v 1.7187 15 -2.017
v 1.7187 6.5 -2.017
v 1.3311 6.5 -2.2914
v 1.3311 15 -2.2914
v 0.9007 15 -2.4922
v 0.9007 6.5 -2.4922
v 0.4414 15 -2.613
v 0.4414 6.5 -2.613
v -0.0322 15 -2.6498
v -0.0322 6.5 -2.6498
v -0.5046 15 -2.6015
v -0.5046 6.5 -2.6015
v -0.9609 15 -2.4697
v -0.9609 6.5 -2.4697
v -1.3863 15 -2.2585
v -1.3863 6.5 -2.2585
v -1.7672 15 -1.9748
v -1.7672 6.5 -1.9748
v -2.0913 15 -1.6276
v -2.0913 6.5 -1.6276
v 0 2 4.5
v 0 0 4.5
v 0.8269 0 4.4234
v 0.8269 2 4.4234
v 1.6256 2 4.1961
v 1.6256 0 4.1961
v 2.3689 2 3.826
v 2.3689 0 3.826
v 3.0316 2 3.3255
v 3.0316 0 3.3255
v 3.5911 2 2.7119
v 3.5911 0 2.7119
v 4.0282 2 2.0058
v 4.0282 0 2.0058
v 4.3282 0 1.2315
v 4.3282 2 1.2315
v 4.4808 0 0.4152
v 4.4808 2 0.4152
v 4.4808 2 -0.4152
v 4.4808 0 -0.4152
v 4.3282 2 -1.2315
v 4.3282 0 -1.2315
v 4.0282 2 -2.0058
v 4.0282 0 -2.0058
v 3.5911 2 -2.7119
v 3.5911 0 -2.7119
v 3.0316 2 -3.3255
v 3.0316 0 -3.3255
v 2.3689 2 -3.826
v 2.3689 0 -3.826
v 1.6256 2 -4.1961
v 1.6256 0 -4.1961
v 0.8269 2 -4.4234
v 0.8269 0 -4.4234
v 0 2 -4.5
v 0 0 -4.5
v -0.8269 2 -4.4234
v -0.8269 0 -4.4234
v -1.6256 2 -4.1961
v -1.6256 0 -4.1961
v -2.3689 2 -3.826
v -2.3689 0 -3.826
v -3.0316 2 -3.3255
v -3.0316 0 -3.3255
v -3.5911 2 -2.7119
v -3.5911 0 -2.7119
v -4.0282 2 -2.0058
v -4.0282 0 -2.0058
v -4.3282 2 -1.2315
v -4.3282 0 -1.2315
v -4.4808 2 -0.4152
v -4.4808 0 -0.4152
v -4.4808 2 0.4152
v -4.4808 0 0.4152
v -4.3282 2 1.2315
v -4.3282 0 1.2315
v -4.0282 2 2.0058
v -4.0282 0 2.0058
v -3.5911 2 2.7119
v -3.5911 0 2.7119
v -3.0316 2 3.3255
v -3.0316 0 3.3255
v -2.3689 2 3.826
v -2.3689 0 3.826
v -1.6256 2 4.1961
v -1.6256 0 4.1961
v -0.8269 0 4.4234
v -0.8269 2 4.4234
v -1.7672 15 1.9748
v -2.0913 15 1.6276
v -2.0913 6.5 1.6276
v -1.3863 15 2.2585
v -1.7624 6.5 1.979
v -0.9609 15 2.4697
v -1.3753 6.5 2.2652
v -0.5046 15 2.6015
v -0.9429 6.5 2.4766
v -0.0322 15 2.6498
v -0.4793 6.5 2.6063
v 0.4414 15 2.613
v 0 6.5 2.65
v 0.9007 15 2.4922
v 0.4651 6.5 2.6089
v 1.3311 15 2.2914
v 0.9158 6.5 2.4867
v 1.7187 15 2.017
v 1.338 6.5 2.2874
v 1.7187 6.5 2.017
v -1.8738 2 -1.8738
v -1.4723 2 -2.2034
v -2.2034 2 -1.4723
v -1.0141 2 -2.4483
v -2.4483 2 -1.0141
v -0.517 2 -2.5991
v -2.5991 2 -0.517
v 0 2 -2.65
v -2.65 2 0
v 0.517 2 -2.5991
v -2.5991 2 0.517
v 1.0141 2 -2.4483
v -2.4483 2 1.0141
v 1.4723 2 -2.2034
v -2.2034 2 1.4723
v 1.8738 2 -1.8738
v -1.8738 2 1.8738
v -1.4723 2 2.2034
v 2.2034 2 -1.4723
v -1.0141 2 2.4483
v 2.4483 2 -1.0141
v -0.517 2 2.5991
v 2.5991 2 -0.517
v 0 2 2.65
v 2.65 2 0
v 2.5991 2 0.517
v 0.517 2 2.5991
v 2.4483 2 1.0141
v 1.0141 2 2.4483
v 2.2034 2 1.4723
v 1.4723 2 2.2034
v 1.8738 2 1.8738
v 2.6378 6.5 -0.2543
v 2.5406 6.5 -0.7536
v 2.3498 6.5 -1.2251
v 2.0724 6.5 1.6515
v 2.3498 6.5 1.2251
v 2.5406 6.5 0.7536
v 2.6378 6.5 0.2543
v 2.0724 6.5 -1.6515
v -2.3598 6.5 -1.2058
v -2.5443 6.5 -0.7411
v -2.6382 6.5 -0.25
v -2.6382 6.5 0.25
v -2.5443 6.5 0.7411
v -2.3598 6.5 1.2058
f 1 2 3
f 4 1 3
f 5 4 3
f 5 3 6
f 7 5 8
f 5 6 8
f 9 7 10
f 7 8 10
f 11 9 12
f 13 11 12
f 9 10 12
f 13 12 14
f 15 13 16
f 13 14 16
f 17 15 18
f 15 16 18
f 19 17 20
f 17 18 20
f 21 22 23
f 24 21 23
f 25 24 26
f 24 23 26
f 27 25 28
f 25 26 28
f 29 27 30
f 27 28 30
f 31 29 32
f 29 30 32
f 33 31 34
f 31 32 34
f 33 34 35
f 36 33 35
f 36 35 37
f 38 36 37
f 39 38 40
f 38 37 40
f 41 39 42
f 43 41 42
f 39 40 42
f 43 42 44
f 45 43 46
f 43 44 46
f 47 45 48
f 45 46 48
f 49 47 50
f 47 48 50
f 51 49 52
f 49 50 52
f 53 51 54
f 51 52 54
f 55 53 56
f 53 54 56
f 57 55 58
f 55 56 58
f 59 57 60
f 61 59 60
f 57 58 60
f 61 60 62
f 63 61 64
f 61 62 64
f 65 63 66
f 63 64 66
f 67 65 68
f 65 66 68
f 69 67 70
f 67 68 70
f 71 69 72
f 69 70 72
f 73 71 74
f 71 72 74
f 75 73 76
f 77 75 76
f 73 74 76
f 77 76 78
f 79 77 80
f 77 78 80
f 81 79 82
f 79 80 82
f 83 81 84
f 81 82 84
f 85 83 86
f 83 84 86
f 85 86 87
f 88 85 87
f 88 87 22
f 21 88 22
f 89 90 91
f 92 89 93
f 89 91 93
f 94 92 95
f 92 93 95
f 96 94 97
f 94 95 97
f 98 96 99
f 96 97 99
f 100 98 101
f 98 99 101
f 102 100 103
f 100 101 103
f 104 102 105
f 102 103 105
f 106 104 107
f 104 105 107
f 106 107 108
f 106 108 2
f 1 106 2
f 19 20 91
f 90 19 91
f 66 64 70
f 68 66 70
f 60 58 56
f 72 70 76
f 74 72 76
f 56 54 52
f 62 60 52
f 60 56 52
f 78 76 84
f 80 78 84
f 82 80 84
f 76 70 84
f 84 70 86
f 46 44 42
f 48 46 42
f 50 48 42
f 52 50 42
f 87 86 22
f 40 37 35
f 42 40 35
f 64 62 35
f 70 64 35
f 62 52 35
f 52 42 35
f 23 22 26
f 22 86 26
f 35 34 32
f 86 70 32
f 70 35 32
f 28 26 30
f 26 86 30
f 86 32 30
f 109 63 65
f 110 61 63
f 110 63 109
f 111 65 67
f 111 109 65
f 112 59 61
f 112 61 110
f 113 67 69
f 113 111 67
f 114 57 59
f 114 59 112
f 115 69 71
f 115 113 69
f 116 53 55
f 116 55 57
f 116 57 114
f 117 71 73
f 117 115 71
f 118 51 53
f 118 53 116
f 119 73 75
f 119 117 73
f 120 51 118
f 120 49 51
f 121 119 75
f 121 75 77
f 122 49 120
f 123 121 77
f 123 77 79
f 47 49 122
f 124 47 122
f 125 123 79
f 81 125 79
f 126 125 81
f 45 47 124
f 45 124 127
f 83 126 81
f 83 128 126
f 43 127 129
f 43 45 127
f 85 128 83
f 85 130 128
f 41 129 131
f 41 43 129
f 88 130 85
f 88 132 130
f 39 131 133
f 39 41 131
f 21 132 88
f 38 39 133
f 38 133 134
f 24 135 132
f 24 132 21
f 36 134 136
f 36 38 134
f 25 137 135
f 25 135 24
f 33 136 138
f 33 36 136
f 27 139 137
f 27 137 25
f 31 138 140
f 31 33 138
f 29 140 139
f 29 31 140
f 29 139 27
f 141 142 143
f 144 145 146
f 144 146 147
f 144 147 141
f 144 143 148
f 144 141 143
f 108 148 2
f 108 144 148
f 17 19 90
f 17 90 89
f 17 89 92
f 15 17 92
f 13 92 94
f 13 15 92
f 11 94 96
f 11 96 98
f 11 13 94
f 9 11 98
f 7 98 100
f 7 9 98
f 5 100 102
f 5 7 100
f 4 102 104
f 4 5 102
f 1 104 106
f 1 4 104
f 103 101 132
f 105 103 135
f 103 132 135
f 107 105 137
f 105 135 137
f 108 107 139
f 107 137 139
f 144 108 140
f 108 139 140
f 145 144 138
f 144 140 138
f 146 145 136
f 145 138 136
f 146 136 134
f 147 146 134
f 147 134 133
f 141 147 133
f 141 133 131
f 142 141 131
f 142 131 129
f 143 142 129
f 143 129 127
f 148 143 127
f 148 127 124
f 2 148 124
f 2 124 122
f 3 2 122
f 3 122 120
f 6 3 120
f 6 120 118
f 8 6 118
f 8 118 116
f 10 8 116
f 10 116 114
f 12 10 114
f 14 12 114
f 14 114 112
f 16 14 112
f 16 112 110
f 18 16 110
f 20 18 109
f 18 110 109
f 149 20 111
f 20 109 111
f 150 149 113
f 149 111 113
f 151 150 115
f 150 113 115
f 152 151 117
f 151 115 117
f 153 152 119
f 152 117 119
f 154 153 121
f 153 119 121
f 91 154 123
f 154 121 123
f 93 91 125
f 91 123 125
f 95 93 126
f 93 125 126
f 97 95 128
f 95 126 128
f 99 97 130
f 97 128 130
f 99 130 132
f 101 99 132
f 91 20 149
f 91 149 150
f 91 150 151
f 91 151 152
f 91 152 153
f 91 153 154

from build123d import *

# Parameters (mm, degrees)
SKETCH1_R           = 4.5
BOSS_EXTRUDE1_DEPTH = 2
SKETCH2_R           = 2.65
BOSS_EXTRUDE2_DEPTH = 4.5
BOSS_EXTRUDE3_DEPTH = 8.5


with BuildPart() as part:
    # Sketch1 → Boss-Extrude1 (new body)
    with BuildSketch(Plane(origin=(0, 0, 0), x_dir=(1, 0, 0), z_dir=(0, 1, 0))):
        with Locations(Location((0, 0, 0), (0, 0, 270))):
            Circle(SKETCH1_R)
    extrude(amount=BOSS_EXTRUDE1_DEPTH)

    # Sketch2 → Boss-Extrude2 (add)
    with BuildSketch(Plane(origin=(0, 2, 0), x_dir=(1, 0, 0), z_dir=(0, 1, 0))):
        with Locations(Location((0, 0, 0), (0, 0, 270))):
            Circle(SKETCH2_R)
    extrude(amount=BOSS_EXTRUDE2_DEPTH)

    # Sketch4 → Boss-Extrude3 (add)
    with BuildSketch(Plane(origin=(0, 6.5, 0), x_dir=(1, 0, 0), z_dir=(0, 1, 0))):
        with BuildLine():
            Line((1.718727688, -2.017046141), (1.718727688, 2.017046141))
            ThreePointArc((1.718727688, 2.017046141), (-0.269470865, 2.63626354), (-2.091272312, 1.627599495))
            Line((-2.091272312, 1.627599495), (-2.091272312, -1.627599495))
            ThreePointArc((-2.091272312, -1.627599495), (-0.269470865, -2.63626354), (1.718727688, -2.017046141))
        make_face()
    extrude(amount=BOSS_EXTRUDE3_DEPTH)


solid = part.part
